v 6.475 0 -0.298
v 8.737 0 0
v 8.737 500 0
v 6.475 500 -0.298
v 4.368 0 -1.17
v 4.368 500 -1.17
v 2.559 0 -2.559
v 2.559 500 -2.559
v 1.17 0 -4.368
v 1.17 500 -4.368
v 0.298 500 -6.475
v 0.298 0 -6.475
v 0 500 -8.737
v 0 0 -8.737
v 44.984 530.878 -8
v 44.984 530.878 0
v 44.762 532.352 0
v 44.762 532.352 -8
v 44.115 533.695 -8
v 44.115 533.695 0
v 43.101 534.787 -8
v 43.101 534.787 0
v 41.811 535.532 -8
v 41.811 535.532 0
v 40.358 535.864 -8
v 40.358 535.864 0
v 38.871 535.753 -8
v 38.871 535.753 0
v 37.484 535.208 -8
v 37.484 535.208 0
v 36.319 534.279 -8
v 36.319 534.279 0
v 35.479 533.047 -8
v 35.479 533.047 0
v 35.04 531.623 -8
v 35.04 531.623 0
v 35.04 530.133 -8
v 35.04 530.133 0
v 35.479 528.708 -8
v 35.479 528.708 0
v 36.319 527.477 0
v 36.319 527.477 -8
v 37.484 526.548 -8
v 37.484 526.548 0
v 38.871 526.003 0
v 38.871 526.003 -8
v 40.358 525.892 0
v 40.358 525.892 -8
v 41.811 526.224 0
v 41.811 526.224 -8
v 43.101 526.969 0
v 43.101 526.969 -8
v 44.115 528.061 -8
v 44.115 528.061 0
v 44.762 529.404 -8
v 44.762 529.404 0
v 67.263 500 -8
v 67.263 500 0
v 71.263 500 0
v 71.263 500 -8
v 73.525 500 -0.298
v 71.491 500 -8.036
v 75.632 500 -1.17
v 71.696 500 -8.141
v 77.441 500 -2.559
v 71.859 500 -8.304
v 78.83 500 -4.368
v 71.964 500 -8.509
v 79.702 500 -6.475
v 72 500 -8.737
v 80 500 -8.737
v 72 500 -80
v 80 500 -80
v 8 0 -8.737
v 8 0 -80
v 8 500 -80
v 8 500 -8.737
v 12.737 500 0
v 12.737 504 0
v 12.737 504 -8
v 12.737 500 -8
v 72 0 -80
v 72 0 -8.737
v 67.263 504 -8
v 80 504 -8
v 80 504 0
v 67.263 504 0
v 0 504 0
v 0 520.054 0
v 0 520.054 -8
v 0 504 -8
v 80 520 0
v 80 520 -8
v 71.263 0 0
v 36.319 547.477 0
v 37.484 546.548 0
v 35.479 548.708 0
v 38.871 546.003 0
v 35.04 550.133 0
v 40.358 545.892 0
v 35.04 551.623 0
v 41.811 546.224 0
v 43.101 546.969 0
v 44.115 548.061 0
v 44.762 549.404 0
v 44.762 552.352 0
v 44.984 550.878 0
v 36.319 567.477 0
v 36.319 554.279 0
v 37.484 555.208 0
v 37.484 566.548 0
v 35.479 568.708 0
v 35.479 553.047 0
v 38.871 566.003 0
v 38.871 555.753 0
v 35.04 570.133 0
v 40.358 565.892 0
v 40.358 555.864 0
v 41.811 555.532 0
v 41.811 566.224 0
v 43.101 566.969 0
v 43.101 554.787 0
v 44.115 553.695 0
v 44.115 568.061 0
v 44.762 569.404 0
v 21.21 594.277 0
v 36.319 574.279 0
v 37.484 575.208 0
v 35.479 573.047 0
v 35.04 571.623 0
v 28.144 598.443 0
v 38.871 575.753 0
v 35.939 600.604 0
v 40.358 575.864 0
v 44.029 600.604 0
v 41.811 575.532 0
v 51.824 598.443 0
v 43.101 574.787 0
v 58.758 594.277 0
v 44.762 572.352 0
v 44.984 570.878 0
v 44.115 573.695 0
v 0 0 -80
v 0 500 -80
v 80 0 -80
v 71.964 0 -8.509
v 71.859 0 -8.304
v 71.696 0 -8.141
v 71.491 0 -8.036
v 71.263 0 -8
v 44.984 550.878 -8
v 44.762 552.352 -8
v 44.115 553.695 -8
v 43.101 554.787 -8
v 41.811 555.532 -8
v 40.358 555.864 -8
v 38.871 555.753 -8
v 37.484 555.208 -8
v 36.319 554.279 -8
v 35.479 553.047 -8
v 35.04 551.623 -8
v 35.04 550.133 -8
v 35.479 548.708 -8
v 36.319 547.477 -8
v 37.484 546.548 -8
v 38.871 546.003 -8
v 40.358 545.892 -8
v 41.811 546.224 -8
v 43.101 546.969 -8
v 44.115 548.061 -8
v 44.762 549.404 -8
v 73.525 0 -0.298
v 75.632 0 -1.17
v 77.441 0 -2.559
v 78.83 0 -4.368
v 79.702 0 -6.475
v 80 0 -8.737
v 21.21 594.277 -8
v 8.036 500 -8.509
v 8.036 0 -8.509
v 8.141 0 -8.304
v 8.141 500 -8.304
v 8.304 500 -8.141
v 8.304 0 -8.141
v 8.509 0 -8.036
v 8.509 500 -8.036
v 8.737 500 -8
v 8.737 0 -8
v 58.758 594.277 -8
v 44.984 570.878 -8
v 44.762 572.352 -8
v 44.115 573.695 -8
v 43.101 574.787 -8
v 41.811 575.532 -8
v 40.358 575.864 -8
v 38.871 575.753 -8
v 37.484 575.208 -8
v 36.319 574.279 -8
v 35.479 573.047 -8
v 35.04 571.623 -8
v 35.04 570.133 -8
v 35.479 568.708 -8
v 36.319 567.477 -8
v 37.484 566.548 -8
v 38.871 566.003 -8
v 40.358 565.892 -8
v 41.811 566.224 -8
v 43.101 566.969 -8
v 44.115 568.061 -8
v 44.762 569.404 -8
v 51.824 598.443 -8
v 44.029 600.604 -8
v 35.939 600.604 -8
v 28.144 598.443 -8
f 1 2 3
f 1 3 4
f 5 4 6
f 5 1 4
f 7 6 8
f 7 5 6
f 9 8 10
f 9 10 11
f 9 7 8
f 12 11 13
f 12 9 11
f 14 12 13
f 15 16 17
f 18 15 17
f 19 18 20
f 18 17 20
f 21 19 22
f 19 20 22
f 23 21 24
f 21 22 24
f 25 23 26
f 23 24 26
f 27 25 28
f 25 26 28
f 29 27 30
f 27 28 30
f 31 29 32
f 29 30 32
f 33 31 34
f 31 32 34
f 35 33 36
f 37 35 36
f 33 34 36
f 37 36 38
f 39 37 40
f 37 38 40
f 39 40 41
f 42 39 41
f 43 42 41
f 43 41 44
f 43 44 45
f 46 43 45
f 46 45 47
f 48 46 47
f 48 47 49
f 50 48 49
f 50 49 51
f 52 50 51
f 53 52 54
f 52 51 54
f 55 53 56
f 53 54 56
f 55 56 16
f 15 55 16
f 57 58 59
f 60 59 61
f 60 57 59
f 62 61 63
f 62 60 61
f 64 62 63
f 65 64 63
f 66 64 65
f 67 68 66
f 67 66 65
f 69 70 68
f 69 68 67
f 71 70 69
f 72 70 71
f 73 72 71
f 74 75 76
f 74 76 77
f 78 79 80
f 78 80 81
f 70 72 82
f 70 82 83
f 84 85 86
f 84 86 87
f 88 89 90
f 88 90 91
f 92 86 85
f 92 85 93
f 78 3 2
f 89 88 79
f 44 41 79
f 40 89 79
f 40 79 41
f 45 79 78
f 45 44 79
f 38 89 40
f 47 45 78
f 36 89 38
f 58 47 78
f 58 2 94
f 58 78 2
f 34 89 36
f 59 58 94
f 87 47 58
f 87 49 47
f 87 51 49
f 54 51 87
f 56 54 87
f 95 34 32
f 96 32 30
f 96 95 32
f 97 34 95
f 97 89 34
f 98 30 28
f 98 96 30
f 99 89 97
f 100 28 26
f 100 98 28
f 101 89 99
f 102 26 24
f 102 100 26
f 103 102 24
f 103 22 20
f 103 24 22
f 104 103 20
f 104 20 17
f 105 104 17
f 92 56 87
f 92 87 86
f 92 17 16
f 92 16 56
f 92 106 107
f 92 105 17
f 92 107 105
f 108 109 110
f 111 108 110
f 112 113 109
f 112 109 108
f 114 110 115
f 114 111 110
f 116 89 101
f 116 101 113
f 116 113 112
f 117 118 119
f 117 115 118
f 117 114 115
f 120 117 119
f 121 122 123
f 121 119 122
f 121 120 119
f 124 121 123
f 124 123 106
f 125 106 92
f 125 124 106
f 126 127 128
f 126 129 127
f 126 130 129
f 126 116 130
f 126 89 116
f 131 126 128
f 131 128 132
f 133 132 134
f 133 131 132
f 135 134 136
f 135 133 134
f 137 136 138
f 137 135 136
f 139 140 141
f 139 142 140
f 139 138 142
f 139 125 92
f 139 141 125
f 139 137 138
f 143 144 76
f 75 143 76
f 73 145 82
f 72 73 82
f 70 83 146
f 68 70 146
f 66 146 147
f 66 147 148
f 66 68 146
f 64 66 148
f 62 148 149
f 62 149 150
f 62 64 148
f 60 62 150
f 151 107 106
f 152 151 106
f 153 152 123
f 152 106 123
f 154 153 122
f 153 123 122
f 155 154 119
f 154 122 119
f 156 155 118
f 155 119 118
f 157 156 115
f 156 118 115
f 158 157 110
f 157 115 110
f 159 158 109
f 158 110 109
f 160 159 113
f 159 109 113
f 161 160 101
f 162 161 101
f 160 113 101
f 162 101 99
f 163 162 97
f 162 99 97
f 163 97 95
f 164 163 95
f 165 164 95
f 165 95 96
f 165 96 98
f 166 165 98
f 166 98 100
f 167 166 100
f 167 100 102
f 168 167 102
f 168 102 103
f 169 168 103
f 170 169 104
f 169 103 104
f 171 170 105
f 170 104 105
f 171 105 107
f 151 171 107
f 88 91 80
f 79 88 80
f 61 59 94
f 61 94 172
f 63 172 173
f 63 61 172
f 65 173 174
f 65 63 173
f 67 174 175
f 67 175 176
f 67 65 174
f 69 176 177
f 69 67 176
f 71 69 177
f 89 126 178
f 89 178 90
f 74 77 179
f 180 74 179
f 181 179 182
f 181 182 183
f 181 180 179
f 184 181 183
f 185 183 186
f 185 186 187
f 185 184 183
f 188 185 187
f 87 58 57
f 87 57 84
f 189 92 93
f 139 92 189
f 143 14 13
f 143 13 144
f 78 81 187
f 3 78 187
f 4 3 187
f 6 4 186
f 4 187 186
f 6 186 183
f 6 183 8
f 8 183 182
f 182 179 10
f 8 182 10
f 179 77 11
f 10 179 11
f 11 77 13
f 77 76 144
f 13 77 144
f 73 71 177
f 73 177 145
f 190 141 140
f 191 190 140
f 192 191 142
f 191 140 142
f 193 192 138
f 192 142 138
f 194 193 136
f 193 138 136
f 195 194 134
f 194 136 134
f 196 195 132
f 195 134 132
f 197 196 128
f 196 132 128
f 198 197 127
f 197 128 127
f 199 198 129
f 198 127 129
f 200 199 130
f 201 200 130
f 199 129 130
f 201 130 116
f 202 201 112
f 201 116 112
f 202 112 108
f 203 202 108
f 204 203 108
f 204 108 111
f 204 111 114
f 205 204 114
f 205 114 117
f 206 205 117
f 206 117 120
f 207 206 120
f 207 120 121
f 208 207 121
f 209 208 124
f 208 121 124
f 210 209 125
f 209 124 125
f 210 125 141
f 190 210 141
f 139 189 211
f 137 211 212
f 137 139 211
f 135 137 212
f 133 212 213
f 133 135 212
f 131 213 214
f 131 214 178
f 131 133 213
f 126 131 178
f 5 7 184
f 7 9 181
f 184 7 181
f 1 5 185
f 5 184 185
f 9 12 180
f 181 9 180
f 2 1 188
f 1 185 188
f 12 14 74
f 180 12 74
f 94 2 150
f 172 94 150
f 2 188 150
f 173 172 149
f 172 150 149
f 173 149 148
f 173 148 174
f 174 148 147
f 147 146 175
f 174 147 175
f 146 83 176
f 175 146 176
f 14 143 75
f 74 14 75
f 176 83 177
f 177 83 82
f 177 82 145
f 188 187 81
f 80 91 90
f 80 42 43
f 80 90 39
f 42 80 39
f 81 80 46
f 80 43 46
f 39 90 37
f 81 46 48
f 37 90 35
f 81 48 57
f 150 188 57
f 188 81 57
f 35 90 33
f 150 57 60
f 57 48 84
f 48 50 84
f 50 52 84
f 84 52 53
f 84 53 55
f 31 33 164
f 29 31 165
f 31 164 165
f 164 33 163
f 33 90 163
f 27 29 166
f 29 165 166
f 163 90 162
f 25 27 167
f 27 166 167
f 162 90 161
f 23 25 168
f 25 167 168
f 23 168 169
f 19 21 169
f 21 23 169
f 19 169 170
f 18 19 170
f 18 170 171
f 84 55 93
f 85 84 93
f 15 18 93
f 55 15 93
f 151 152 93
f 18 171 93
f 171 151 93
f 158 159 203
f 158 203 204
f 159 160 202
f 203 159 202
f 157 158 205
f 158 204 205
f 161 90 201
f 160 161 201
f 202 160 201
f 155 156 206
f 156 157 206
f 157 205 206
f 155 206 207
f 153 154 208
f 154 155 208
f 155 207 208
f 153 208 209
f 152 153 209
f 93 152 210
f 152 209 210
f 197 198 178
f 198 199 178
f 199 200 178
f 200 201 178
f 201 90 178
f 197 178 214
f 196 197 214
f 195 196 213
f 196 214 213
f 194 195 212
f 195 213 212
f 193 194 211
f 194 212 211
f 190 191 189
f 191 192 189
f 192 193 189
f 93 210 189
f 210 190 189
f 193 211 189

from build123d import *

# Parameters (mm, degrees)
SKETCH_1_R                        = 5
SM_BASE_FLANGE_2_DEPTH            = 8
SM_EDGE_FLANGE_4_STRIP_W          = 33.4732
SM_EDGE_FLANGE_4_STRIP_H          = 8
SM_EDGE_FLANGE_4_STRIP_CUT_DEPTH  = 500
SM_EDGE_FLANGE_4_RELIEF_W         = 37.4732
SM_EDGE_FLANGE_4_RELIEF_H         = 4
SM_EDGE_FLANGE_4_RELIEF_CUT_DEPTH = 8
SM_EDGE_FLANGE_4_DEPTH            = 500
SM_EDGE_FLANGE_8_STRIP_W          = 33.4732
SM_EDGE_FLANGE_8_STRIP_H          = 8
SM_EDGE_FLANGE_8_STRIP_CUT_DEPTH  = 500
SM_EDGE_FLANGE_8_RELIEF_W         = 37.4732
SM_EDGE_FLANGE_8_RELIEF_H         = 4
SM_EDGE_FLANGE_8_RELIEF_CUT_DEPTH = 8
SM_EDGE_FLANGE_8_DEPTH            = 500


# Sheet-metal steps are written as plain solids
with BuildPart() as part:
    # 草图1 → 基体-法兰2 (new body)
    with BuildSketch(Plane.XY):
        with BuildLine():
            Line((0, 0), (80, 0))
            Line((80, 0), (80, 520))
            Line((80, 520), (58.758007847, 594.277403974))
            ThreePointArc((58.758007847, 594.277403974), (39.983985428, 600.877915043), (21.209963009, 594.277403974))
            Line((21.209963009, 594.277403974), (0, 520.054307268))
            Line((0, 520.054307268), (0, 0))
        make_face()
        with Locations((39.983985428, 570.877915043)):
            Circle(SKETCH_1_R, mode=Mode.SUBTRACT)
        with Locations((39.983985428, 550.877915043)):
            Circle(SKETCH_1_R, mode=Mode.SUBTRACT)
        with Locations((39.983985428, 530.877915043)):
            Circle(SKETCH_1_R, mode=Mode.SUBTRACT)
    extrude(amount=-SM_BASE_FLANGE_2_DEPTH)

    # 边线-法兰4 strip (across the edge) → 边线-法兰4 strip cut (cut)
    with BuildSketch(Plane(origin=(0, 0, -8), x_dir=(1, 0, 0), z_dir=(0, 1, 0))):
        with Locations((-8, -4)):
            Rectangle(SM_EDGE_FLANGE_4_STRIP_W, SM_EDGE_FLANGE_4_STRIP_H)
    extrude(amount=SM_EDGE_FLANGE_4_STRIP_CUT_DEPTH, mode=Mode.SUBTRACT)

    # 边线-法兰4 relief (on the sheet) → 边线-法兰4 relief cut (cut)
    with BuildSketch(Plane(origin=(8.7366, 0, -8), x_dir=(1, 0, 0), z_dir=(0, 0, -1))):
        with Locations((-14.7366, -502)):
            Rectangle(SM_EDGE_FLANGE_4_RELIEF_W, SM_EDGE_FLANGE_4_RELIEF_H)
    extrude(amount=-SM_EDGE_FLANGE_4_RELIEF_CUT_DEPTH, mode=Mode.SUBTRACT)

    # 边线-法兰4 section (across the edge) → 边线-法兰4 (add)
    with BuildSketch(Plane(origin=(0, 0, -8), x_dir=(1, 0, 0), z_dir=(0, 1, 0))):
        with BuildLine():
            Line((0, 0.7366), (0, 72))
            Line((0, 72), (8, 72))
            Line((8, 72), (8, 0.7366))
            ThreePointArc((8, 0.7366), (8.215745145, 0.215745145), (8.7366, 0))
            Line((8.7366, 0), (8.7366, -8))
            ThreePointArc((8.7366, -8), (2.558890895, -5.441109105), (0, 0.7366))
        make_face()
    extrude(amount=SM_EDGE_FLANGE_4_DEPTH)

    # 边线-法兰8 strip (across the edge) → 边线-法兰8 strip cut (cut)
    with BuildSketch(Plane(origin=(80, 500, -8), x_dir=(-1, 0, 0), z_dir=(0, -1, 0))):
        with Locations((-8, -4)):
            Rectangle(SM_EDGE_FLANGE_8_STRIP_W, SM_EDGE_FLANGE_8_STRIP_H)
    extrude(amount=SM_EDGE_FLANGE_8_STRIP_CUT_DEPTH, mode=Mode.SUBTRACT)

    # 边线-法兰8 relief (on the sheet) → 边线-法兰8 relief cut (cut)
    with BuildSketch(Plane(origin=(71.2634, 500, -8), x_dir=(-1, 0, 0), z_dir=(0, 0, -1))):
        with Locations((-14.7366, 2)):
            Rectangle(SM_EDGE_FLANGE_8_RELIEF_W, SM_EDGE_FLANGE_8_RELIEF_H)
    extrude(amount=-SM_EDGE_FLANGE_8_RELIEF_CUT_DEPTH, mode=Mode.SUBTRACT)

    # 边线-法兰8 section (across the edge) → 边线-法兰8 (add)
    with BuildSketch(Plane(origin=(80, 500, -8), x_dir=(-1, 0, 0), z_dir=(0, -1, 0))):
        with BuildLine():
            Line((0, 0.7366), (0, 72))
            Line((0, 72), (8, 72))
            Line((8, 72), (8, 0.7366))
            ThreePointArc((8, 0.7366), (8.215745145, 0.215745145), (8.7366, 0))
            Line((8.7366, 0), (8.7366, -8))
            ThreePointArc((8.7366, -8), (2.558890895, -5.441109105), (0, 0.7366))
        make_face()
    extrude(amount=SM_EDGE_FLANGE_8_DEPTH)


solid = part.part
